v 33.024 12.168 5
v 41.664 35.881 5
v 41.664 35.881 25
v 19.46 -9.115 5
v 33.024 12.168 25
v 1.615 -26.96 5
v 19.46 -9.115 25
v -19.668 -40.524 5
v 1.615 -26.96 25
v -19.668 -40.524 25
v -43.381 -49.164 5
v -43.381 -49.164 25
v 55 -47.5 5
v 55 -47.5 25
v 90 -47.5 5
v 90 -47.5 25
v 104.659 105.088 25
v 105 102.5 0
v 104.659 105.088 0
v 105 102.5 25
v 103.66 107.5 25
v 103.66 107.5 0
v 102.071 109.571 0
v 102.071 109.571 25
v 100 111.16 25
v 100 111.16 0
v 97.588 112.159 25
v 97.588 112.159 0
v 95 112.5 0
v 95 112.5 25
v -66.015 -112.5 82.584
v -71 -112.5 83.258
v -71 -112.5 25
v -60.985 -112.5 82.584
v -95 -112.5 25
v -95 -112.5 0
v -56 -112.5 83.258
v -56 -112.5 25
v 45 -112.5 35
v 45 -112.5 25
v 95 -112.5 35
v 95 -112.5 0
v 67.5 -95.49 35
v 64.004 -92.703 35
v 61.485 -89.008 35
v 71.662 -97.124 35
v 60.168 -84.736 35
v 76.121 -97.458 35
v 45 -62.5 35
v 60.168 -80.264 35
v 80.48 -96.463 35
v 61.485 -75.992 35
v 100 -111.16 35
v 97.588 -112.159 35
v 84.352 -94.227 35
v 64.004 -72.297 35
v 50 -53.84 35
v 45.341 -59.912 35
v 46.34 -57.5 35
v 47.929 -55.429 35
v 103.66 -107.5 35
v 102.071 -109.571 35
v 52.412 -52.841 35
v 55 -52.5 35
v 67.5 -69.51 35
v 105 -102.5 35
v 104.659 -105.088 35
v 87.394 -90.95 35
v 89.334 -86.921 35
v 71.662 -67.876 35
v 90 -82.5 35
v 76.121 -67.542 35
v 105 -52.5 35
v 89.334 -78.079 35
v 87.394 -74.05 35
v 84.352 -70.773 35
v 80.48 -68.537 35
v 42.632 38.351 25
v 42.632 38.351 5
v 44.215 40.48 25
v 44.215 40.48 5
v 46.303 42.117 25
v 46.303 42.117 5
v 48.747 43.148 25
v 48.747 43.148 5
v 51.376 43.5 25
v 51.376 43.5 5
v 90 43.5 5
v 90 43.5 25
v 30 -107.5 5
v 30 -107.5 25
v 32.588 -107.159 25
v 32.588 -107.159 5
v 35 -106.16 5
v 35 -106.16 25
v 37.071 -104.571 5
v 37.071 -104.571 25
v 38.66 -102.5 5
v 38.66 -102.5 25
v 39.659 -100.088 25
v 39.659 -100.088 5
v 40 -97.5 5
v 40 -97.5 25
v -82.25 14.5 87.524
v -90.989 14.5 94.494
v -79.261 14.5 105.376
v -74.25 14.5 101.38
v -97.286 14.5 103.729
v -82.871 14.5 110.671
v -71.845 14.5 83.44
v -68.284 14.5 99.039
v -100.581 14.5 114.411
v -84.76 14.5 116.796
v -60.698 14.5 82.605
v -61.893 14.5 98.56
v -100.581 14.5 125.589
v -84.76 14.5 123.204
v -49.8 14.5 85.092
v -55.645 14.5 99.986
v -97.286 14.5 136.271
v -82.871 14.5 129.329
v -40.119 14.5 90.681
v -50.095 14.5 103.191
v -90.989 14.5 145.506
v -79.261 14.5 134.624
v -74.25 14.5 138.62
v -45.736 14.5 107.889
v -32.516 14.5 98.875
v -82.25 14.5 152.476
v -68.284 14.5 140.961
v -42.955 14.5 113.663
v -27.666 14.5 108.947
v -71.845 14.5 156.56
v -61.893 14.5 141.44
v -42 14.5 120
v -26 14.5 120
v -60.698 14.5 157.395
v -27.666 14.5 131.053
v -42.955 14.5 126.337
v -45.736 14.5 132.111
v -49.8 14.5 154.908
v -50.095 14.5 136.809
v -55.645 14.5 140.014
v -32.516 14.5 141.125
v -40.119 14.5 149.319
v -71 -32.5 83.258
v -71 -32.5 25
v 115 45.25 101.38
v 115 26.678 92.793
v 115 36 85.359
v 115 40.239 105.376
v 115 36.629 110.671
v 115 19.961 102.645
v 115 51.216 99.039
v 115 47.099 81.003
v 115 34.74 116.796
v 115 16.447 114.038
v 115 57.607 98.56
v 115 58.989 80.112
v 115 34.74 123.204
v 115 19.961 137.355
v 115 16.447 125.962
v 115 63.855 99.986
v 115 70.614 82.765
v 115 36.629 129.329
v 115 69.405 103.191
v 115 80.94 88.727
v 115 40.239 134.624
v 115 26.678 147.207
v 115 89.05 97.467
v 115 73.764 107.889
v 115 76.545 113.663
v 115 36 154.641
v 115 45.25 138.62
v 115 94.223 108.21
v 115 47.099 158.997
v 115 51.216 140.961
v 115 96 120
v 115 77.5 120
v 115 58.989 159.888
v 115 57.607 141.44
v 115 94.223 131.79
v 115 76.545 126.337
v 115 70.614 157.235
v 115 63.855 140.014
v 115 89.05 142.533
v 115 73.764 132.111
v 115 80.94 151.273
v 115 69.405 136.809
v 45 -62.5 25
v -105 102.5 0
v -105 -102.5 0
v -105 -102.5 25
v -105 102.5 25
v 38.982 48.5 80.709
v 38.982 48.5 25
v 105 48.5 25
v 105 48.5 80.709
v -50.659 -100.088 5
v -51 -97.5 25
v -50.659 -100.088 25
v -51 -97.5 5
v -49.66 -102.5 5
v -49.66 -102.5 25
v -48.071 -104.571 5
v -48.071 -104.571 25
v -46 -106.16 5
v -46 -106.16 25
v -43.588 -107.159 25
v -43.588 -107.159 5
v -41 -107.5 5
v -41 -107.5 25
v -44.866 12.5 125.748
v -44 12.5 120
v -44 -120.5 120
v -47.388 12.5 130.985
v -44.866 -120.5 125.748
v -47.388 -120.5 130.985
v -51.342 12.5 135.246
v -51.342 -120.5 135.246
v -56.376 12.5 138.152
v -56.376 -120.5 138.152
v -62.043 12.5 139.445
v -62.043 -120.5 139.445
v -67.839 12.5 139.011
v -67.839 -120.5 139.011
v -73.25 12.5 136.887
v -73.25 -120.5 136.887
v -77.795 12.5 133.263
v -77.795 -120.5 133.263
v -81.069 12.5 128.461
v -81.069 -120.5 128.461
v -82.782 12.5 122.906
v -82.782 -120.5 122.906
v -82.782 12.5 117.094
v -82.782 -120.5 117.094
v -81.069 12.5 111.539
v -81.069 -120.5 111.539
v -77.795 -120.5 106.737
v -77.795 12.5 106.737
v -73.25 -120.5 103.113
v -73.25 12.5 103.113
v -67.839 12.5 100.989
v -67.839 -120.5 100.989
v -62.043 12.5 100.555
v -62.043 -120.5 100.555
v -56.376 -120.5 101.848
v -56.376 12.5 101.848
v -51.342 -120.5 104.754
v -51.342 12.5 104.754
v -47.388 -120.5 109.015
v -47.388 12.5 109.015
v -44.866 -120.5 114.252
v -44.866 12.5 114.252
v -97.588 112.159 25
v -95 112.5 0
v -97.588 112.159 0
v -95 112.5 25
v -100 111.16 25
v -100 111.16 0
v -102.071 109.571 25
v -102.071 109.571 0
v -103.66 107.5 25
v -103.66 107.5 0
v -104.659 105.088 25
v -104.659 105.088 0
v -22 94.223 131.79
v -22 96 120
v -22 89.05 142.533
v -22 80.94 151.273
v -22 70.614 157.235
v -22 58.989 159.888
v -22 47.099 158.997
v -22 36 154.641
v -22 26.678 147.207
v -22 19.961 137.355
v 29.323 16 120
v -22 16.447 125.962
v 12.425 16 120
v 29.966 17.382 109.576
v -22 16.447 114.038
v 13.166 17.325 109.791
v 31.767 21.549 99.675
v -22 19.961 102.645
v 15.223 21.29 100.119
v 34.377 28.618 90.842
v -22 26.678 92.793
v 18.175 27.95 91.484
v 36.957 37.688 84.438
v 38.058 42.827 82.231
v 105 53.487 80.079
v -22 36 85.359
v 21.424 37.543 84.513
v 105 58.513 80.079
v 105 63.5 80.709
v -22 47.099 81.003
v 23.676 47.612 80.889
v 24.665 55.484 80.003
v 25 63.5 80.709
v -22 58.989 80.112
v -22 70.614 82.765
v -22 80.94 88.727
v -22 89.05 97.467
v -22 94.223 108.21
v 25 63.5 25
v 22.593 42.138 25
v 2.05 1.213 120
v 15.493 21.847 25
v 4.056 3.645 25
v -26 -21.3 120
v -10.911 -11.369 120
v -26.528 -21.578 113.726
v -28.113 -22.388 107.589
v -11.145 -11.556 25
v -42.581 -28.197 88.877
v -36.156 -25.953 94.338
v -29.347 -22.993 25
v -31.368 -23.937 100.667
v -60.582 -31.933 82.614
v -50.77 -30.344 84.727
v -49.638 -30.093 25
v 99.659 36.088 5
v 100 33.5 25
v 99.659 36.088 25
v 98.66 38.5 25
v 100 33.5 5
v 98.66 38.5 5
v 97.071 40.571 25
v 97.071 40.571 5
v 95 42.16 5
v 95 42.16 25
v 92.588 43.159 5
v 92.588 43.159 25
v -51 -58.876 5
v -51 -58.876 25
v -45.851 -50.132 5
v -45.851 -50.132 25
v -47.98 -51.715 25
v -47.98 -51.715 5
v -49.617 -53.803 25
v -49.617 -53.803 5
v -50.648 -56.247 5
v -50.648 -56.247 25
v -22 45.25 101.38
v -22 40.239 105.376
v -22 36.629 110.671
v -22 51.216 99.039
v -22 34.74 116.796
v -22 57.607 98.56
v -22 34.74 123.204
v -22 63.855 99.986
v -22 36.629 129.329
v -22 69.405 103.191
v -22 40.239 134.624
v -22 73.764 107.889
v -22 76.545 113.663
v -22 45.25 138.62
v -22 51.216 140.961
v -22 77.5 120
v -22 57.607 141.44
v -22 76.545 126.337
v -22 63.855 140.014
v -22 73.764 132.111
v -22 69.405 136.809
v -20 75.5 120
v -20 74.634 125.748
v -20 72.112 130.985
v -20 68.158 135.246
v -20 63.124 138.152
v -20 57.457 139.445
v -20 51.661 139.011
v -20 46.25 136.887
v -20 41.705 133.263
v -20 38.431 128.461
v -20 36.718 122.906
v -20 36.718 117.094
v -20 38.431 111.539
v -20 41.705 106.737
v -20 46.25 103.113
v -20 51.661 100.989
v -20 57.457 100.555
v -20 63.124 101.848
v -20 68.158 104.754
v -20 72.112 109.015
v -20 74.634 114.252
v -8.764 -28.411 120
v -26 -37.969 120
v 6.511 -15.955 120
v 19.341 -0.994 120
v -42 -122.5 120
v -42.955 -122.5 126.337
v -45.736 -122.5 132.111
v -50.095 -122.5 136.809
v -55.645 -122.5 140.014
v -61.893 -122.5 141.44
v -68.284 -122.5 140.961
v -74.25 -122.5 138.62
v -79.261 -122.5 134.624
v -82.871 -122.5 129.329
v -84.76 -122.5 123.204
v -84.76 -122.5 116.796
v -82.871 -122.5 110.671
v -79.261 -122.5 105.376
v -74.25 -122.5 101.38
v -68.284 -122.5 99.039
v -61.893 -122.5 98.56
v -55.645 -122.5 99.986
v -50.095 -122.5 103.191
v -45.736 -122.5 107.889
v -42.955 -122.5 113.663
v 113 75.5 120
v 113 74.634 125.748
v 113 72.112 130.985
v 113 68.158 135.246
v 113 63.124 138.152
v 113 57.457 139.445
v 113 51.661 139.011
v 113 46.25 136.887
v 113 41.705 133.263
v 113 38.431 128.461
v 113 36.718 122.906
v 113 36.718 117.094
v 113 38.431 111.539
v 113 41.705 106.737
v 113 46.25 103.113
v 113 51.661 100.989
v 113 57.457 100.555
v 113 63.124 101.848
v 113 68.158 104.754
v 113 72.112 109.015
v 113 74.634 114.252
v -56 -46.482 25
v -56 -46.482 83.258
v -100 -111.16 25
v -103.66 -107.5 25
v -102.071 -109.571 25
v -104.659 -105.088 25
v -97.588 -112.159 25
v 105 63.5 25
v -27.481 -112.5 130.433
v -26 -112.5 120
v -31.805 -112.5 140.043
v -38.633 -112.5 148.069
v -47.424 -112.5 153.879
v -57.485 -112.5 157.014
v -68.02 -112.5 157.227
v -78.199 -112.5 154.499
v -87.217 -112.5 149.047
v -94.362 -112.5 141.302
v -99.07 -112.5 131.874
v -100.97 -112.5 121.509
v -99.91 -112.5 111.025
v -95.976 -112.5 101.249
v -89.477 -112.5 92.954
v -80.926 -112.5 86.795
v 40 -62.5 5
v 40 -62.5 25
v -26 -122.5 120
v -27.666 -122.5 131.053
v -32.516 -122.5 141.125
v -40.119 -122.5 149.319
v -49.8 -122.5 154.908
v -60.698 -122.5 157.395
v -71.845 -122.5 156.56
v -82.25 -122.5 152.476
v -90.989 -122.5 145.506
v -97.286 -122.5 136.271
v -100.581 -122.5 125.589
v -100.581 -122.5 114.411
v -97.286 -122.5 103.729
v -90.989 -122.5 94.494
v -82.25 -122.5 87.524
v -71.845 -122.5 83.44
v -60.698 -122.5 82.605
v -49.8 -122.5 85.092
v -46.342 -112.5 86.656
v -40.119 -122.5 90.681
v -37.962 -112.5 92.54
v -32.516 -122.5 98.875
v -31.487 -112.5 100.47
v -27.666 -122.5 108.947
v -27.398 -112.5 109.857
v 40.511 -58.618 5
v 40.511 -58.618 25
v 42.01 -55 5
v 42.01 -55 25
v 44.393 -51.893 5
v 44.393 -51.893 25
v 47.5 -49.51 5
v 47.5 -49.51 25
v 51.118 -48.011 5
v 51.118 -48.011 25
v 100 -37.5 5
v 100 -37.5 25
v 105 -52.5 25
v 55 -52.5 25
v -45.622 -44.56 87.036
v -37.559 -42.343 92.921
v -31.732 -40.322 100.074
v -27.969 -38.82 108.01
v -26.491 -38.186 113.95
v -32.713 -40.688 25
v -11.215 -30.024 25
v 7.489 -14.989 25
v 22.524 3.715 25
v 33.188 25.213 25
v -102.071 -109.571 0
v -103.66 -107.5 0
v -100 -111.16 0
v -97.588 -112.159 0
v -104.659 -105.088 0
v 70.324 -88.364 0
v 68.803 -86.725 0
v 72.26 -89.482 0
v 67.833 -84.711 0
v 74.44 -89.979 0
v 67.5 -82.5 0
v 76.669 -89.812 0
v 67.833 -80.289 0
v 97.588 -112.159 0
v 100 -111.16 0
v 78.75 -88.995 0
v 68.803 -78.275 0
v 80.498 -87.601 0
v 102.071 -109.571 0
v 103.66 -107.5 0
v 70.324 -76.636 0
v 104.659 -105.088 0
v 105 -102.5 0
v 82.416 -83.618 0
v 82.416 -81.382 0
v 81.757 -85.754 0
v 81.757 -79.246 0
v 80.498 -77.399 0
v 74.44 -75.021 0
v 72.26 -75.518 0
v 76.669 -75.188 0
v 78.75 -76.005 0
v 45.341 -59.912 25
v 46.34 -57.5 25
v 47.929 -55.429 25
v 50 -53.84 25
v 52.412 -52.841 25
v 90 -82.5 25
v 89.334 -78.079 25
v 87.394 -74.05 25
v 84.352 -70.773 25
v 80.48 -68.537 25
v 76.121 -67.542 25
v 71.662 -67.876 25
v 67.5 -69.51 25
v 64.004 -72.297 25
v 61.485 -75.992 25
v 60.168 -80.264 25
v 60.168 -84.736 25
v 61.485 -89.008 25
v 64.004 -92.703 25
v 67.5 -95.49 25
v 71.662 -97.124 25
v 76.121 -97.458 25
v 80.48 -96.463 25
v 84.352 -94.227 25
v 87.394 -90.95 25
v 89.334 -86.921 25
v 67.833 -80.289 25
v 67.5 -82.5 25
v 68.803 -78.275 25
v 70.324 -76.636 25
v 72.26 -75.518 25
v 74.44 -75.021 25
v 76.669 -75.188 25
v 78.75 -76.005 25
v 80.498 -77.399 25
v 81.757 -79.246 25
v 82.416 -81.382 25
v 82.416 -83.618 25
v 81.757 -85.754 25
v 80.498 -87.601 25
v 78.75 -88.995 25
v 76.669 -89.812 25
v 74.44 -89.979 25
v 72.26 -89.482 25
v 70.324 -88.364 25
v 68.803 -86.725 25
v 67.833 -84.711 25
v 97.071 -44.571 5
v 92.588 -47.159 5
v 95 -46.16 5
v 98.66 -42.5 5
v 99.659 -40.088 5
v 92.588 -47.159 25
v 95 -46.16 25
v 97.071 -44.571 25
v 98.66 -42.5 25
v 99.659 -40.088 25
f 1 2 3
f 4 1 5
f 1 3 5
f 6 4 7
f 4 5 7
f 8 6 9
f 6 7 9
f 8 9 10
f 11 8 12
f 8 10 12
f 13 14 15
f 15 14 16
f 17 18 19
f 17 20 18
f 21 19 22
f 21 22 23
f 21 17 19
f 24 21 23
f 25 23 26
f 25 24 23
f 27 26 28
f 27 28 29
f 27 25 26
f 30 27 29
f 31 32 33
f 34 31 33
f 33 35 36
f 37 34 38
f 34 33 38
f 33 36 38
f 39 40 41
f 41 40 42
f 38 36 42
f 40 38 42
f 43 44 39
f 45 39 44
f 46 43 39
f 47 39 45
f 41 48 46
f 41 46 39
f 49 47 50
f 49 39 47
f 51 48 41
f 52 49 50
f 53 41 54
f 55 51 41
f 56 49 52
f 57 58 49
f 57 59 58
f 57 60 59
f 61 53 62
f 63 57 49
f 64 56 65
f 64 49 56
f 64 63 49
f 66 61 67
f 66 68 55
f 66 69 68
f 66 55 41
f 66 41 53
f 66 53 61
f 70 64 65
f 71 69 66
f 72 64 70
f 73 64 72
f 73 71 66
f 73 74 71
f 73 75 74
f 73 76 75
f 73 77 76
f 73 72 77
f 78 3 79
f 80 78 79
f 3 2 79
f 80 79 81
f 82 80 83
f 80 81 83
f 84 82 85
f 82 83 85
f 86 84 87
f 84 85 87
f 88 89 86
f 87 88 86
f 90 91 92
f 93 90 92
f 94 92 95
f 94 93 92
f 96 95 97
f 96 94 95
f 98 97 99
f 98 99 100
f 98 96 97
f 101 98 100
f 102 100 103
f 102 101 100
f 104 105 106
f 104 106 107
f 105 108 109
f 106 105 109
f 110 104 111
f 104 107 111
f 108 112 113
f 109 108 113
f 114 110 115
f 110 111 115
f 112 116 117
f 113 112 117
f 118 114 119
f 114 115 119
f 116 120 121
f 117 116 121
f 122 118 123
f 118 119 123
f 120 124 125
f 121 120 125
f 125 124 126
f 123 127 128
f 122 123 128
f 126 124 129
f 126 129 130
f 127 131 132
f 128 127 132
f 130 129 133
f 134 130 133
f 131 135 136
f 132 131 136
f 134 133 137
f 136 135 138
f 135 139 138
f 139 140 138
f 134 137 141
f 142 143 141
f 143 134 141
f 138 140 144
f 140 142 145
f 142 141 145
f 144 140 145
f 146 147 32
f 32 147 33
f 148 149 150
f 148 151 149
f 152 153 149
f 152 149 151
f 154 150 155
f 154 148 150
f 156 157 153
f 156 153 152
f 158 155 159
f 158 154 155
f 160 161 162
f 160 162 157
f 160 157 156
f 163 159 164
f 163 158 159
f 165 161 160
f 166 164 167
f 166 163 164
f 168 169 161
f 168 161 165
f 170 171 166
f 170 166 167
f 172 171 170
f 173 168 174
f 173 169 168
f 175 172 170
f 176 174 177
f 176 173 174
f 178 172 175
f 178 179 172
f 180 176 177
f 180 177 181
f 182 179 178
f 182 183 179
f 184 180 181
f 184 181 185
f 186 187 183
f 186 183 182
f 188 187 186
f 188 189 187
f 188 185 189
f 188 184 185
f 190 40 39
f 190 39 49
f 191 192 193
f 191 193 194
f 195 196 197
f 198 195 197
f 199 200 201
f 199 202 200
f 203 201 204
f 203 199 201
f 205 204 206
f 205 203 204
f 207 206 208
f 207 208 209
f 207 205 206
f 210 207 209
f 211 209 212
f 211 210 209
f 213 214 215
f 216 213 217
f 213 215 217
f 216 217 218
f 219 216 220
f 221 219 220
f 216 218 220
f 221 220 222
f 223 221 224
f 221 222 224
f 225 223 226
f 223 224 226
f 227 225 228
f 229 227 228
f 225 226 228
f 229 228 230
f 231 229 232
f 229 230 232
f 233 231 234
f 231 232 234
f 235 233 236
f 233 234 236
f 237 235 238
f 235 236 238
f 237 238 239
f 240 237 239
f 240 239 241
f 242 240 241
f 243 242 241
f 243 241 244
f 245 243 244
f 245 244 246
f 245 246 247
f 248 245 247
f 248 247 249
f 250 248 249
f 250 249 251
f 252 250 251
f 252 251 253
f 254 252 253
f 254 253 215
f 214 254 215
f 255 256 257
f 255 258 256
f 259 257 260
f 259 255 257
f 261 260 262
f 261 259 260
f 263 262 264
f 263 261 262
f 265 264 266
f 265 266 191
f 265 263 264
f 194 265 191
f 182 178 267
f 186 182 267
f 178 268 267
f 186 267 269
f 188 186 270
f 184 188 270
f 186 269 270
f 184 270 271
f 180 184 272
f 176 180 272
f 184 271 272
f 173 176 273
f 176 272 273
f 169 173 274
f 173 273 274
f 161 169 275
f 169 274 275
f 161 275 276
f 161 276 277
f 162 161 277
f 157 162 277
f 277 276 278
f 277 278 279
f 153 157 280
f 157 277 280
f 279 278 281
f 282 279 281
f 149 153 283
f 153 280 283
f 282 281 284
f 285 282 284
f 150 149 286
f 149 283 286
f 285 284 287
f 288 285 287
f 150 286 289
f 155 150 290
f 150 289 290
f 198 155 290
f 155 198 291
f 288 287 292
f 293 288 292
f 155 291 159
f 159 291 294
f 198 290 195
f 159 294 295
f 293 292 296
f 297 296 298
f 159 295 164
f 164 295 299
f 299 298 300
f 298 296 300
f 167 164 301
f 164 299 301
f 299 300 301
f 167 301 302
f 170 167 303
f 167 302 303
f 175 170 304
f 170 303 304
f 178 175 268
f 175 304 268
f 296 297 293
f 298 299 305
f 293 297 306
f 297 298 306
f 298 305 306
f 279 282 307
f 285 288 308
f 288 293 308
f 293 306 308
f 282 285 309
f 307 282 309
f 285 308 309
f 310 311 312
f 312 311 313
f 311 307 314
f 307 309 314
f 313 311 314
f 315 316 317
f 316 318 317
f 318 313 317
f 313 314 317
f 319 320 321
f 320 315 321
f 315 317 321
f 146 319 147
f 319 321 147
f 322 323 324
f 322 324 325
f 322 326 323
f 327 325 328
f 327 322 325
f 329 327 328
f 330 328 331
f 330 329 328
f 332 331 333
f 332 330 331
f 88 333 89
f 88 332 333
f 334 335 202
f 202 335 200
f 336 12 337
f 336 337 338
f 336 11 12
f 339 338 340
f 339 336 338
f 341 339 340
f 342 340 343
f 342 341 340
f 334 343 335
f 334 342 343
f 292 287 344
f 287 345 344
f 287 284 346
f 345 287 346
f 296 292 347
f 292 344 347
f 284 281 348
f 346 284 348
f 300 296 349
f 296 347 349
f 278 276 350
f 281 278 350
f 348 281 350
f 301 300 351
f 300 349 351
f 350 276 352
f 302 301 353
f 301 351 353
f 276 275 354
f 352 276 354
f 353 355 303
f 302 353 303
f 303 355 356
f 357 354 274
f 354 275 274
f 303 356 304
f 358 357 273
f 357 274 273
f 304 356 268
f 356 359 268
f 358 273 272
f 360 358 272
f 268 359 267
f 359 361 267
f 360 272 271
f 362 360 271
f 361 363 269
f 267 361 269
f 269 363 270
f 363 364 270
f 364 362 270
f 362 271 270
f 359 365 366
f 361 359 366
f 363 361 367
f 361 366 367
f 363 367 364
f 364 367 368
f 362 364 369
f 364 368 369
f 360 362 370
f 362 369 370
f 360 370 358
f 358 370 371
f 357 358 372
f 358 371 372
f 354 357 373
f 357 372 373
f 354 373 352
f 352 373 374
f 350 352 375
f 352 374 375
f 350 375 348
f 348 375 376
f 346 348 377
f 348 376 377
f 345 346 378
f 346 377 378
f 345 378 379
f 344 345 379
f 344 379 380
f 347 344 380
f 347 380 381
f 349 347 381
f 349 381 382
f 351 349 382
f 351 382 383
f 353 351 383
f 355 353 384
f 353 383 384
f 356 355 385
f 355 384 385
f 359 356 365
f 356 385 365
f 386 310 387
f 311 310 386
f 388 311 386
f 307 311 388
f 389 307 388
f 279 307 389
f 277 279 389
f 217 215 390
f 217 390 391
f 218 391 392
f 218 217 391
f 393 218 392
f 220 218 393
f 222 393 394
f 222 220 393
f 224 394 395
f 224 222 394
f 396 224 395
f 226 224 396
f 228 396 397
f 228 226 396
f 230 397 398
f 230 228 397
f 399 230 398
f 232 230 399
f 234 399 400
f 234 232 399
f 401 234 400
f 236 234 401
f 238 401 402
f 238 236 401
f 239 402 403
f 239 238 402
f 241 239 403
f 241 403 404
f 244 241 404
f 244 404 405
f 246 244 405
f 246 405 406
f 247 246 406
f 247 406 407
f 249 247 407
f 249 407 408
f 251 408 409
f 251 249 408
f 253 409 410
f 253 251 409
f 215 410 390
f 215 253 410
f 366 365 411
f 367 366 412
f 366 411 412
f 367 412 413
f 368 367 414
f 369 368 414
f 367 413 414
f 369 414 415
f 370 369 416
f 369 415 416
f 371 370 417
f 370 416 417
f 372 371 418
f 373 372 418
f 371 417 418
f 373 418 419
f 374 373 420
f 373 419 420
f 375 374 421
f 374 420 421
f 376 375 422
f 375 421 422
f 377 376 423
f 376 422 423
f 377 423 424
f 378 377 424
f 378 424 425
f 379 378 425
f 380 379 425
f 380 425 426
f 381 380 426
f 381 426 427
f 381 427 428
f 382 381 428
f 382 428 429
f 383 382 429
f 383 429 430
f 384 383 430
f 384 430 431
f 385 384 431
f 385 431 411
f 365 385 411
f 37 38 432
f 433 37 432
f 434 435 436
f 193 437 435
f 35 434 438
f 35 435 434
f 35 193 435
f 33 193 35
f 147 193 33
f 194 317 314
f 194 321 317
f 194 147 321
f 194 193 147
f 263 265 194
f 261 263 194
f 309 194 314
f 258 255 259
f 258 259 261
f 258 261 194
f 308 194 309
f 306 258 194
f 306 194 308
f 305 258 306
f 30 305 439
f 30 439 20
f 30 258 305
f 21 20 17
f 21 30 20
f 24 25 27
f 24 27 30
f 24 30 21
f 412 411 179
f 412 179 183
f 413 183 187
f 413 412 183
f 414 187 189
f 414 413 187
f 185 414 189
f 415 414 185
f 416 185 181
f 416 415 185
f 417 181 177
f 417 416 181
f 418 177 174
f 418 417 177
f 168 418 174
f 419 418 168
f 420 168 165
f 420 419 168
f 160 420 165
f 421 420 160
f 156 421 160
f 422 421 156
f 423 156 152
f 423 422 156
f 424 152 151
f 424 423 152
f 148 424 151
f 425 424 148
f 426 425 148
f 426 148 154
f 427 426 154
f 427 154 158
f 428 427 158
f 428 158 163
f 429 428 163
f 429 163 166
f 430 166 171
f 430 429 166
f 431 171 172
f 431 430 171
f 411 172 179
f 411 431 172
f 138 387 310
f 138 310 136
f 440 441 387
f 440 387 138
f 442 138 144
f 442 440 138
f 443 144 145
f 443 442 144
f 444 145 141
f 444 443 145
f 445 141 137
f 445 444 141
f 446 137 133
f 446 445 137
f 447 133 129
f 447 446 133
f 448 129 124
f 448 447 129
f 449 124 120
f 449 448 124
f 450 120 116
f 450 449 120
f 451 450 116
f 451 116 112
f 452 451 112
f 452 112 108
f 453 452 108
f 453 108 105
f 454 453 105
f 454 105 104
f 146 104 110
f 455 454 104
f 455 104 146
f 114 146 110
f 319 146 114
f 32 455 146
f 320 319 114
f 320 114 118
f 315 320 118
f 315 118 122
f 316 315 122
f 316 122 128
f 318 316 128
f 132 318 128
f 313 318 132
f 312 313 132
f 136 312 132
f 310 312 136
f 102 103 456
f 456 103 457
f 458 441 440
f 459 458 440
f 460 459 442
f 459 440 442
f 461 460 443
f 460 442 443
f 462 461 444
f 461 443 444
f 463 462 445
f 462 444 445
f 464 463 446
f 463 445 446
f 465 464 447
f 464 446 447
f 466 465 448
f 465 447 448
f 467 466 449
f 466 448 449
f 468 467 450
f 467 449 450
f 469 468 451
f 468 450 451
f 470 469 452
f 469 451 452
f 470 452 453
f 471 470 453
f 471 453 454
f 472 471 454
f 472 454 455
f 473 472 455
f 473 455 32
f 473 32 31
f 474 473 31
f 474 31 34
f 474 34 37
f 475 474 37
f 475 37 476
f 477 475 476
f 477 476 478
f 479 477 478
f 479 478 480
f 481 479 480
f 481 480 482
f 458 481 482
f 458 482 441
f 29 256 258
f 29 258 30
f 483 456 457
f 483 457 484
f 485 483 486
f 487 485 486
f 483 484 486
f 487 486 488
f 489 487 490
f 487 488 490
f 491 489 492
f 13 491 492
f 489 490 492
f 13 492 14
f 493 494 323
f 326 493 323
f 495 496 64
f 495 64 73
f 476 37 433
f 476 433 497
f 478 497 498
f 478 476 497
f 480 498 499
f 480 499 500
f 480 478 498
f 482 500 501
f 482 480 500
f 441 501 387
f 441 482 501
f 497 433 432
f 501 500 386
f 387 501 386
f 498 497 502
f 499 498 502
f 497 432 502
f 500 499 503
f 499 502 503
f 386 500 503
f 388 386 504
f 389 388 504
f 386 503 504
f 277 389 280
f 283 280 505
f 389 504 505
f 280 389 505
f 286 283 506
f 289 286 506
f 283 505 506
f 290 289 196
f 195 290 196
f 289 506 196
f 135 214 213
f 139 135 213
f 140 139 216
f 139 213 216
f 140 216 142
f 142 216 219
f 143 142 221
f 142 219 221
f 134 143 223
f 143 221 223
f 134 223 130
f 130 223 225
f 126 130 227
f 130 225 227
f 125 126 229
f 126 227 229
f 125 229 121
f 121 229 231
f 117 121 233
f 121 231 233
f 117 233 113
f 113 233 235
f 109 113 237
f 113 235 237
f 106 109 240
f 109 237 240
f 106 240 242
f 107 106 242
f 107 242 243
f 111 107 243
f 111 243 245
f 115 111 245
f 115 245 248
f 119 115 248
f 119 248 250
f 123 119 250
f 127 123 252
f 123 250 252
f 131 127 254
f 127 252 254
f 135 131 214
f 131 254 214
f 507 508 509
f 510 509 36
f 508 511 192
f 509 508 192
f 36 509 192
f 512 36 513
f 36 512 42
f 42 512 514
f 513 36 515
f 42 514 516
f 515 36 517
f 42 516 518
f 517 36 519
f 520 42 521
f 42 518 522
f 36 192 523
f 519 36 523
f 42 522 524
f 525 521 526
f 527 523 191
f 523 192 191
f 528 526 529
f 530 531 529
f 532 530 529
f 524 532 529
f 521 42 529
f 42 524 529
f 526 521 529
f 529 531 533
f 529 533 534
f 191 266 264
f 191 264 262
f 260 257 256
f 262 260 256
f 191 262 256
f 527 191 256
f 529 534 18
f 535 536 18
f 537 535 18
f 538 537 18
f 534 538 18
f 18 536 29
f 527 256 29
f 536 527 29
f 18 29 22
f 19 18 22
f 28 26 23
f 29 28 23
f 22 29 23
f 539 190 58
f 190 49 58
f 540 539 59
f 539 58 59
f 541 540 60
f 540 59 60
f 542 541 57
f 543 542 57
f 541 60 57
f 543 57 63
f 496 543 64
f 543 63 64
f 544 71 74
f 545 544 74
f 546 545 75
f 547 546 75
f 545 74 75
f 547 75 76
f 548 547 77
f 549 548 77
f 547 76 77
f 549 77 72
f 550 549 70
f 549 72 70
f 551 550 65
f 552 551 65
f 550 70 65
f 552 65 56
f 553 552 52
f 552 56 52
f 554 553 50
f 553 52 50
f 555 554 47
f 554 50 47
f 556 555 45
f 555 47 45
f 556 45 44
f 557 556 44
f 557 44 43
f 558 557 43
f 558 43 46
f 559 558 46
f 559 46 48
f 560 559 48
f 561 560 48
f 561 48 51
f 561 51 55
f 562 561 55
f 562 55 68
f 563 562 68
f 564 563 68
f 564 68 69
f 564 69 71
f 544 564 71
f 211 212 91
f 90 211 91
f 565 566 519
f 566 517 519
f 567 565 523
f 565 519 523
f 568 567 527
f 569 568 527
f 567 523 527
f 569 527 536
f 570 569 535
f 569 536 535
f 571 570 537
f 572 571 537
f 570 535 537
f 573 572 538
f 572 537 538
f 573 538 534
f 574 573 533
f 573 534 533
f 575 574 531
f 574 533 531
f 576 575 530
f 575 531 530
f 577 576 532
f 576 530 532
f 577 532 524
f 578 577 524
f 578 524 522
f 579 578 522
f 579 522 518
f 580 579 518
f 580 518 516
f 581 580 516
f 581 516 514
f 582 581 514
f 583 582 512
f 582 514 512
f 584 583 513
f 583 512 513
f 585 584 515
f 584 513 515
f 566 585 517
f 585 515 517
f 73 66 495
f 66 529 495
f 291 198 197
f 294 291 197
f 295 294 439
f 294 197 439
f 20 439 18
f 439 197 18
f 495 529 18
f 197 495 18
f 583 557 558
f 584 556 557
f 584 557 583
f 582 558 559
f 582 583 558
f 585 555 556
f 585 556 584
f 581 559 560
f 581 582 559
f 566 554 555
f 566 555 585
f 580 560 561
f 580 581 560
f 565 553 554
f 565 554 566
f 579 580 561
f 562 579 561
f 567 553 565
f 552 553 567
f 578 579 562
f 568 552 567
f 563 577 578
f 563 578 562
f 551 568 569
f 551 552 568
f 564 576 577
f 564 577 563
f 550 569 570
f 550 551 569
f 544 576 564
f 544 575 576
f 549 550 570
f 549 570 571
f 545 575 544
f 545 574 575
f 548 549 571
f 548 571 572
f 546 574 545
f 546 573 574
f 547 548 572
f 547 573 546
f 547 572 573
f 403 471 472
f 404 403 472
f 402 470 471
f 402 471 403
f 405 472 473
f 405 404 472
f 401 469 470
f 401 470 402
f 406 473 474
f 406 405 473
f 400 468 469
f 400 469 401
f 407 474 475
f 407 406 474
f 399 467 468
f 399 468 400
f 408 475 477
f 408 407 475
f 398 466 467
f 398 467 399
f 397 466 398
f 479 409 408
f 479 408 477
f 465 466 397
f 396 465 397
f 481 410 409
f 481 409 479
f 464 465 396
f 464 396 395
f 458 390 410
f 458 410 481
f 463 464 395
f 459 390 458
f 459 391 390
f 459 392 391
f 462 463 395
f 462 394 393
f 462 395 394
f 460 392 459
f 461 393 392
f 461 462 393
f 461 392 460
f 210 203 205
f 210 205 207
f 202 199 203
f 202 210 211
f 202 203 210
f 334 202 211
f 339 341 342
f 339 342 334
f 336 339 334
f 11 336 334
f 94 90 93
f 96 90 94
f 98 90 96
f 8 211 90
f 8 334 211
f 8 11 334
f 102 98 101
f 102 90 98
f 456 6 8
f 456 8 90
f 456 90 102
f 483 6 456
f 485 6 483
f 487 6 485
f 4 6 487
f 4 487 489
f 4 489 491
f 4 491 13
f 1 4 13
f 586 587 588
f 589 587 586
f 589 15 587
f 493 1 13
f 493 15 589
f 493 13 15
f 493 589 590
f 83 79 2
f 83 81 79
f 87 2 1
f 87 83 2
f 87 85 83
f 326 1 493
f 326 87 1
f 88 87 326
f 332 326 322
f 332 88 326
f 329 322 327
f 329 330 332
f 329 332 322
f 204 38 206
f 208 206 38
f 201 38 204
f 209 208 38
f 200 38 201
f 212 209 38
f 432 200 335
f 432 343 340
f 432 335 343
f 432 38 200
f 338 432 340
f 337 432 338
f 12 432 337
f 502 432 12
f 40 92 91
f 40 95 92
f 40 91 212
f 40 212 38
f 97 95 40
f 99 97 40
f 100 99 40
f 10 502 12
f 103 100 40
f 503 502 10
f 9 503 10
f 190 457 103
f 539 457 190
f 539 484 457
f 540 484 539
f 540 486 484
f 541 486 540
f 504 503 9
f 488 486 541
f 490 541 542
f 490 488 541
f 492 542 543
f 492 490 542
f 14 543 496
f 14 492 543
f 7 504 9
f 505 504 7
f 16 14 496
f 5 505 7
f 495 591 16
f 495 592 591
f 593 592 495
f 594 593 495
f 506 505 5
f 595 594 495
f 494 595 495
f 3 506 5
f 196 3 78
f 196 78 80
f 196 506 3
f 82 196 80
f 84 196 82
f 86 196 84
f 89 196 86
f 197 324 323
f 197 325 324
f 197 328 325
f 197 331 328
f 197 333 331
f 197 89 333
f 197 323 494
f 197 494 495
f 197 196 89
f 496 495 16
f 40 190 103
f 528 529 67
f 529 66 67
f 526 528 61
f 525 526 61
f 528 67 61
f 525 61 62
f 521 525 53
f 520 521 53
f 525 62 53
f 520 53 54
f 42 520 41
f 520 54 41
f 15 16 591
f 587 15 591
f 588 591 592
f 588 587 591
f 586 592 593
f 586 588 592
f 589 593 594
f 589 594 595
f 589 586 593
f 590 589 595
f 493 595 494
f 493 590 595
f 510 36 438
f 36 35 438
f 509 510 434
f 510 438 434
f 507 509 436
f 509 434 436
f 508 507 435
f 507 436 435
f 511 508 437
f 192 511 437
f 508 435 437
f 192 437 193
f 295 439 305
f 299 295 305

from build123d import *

# Parameters (mm, degrees)
F0_W            = 210
F0_H            = 225
F1_DEPTH        = 25
F3_DEPTH        = 95
F4_R            = 37.5
F5_DEPTH        = 10
F5_DEPTH_BACK   = 127
F6_R            = 40
F7_DEPTH        = 10
F7_DEPTH_BACK   = 127
F8_W            = 60
F8_H            = 60
F9_DEPTH        = 10
F10_R           = 10
F12_DEPTH       = 20
F14_D           = 15
F14_CBORE_D     = 30
F14_CBORE_DEPTH = 10
F15_R           = 10
F16_R           = 19.5
F17_DEPTH       = 235.001
F18_R           = 19.5
F19_DEPTH       = 220.001
F20_SIZE        = 2
F21_R           = 10


with BuildPart() as f1:
    # F0 (on Top) → F1 (new body)
    with BuildSketch(Plane.XY):
        Rectangle(F0_W, F0_H)
    extrude(amount=F1_DEPTH)

    # F2 (on face) → F3 (join)
    with BuildSketch(Plane.XY.offset(25)):
        with BuildLine():
            Line((-71, -32.5), (-71, -112.5))
            Line((-71, -112.5), (-56, -112.5))
            Line((-56, -112.5), (-56, -46.481817))
            ThreePointArc((-56, -46.481817), (7.488853, -14.988853), (38.981817, 48.5))
            Line((38.981817, 48.5), (105, 48.5))
            Line((105, 48.5), (105, 63.5))
            Line((105, 63.5), (25, 63.5))
            ThreePointArc((25, 63.5), (-3.117749, -4.382251), (-71, -32.5))
        make_face()
    extrude(amount=F3_DEPTH)

    # F4 (on face) → F5 (join, two sides)
    with BuildSketch(Plane.XZ.offset(112.5)) as f5_sk:
        with Locations((-63.5, 120)):
            Circle(F4_R)
    extrude(amount=F5_DEPTH)
    extrude(f5_sk.sketch, amount=-F5_DEPTH_BACK)

    # F6 (on face) → F7 (join, two sides)
    with BuildSketch(Plane.YZ.offset(105)) as f7_sk:
        with Locations((56, 120)):
            Circle(F6_R)
    extrude(amount=F7_DEPTH)
    extrude(f7_sk.sketch, amount=-F7_DEPTH_BACK)

    # F8 (on face) → F9 (join)
    with BuildSketch(Plane.XY.offset(25)):
        with Locations((75, -82.5)):
            Rectangle(F8_W, F8_H)
    extrude(amount=F9_DEPTH)

    # F10
    f10_edges = [f1.edges().sort_by_distance(p)[0] for p in [
        (45, -52.5, 30),
    ]]
    fillet(f10_edges, radius=F10_R)

    # F11 (on face) → F12 (cut)
    with BuildSketch(Plane.XY.offset(25)):
        with BuildLine():
            ThreePointArc((43.262855, 43.5), (11.024387, -18.524387), (-51, -50.762855))
            Line((-51, -50.762855), (-51, -107.5))
            Line((-51, -107.5), (40, -107.5))
            Line((40, -107.5), (40, -62.5))
            ThreePointArc((40, -62.5), (44.393398, -51.893398), (55, -47.5))
            Line((55, -47.5), (100, -47.5))
            Line((100, -47.5), (100, 43.5))
            Line((100, 43.5), (43.262855, 43.5))
        make_face()
    extrude(amount=-F12_DEPTH, mode=Mode.SUBTRACT)

    # F14 (through all)
    with Locations(Plane.XY.offset(35)):
        with Locations((75, -82.5)):
            CounterBoreHole(F14_D / 2, F14_CBORE_D / 2, F14_CBORE_DEPTH)

    # F15
    f15_edges = [f1.edges().sort_by_distance(p)[0] for p in [
        (-51, -50.762855, 15),
        (43.262855, 43.5, 15),
        (100, 43.5, 15),
        (40, -107.5, 15),
        (100, -47.5, 15),
        (-51, -107.5, 15),
    ]]
    fillet(f15_edges, radius=F15_R)

    # F16 (on face) → F17 (cut, through all)
    with BuildSketch(Plane.XZ.offset(122.5)):
        with Locations((-63.5, 120)):
            Circle(F16_R)
    extrude(amount=-F17_DEPTH, mode=Mode.SUBTRACT)

    # F18 (on face) → F19 (cut, through all)
    with BuildSketch(Plane.YZ.offset(115)):
        with Locations((56, 120)):
            Circle(F18_R)
    extrude(amount=-F19_DEPTH, mode=Mode.SUBTRACT)

    # F20
    f20_edges = [f1.edges().sort_by_distance(p)[0] for p in [
        (-83, -122.5, 120),
        (115, 36.5, 120),
        (-22, 36.5, 120),
        (-83, 14.5, 120),
    ]]
    chamfer(f20_edges, length=F20_SIZE)

    # F21
    f21_edges = [f1.edges().sort_by_distance(p)[0] for p in [
        (-105, 112.5, 12.5),
        (-105, -112.5, 12.5),
        (105, 112.5, 12.5),
        (105, -112.5, 17.5),
    ]]
    fillet(f21_edges, radius=F21_R)


solid = f1.part
